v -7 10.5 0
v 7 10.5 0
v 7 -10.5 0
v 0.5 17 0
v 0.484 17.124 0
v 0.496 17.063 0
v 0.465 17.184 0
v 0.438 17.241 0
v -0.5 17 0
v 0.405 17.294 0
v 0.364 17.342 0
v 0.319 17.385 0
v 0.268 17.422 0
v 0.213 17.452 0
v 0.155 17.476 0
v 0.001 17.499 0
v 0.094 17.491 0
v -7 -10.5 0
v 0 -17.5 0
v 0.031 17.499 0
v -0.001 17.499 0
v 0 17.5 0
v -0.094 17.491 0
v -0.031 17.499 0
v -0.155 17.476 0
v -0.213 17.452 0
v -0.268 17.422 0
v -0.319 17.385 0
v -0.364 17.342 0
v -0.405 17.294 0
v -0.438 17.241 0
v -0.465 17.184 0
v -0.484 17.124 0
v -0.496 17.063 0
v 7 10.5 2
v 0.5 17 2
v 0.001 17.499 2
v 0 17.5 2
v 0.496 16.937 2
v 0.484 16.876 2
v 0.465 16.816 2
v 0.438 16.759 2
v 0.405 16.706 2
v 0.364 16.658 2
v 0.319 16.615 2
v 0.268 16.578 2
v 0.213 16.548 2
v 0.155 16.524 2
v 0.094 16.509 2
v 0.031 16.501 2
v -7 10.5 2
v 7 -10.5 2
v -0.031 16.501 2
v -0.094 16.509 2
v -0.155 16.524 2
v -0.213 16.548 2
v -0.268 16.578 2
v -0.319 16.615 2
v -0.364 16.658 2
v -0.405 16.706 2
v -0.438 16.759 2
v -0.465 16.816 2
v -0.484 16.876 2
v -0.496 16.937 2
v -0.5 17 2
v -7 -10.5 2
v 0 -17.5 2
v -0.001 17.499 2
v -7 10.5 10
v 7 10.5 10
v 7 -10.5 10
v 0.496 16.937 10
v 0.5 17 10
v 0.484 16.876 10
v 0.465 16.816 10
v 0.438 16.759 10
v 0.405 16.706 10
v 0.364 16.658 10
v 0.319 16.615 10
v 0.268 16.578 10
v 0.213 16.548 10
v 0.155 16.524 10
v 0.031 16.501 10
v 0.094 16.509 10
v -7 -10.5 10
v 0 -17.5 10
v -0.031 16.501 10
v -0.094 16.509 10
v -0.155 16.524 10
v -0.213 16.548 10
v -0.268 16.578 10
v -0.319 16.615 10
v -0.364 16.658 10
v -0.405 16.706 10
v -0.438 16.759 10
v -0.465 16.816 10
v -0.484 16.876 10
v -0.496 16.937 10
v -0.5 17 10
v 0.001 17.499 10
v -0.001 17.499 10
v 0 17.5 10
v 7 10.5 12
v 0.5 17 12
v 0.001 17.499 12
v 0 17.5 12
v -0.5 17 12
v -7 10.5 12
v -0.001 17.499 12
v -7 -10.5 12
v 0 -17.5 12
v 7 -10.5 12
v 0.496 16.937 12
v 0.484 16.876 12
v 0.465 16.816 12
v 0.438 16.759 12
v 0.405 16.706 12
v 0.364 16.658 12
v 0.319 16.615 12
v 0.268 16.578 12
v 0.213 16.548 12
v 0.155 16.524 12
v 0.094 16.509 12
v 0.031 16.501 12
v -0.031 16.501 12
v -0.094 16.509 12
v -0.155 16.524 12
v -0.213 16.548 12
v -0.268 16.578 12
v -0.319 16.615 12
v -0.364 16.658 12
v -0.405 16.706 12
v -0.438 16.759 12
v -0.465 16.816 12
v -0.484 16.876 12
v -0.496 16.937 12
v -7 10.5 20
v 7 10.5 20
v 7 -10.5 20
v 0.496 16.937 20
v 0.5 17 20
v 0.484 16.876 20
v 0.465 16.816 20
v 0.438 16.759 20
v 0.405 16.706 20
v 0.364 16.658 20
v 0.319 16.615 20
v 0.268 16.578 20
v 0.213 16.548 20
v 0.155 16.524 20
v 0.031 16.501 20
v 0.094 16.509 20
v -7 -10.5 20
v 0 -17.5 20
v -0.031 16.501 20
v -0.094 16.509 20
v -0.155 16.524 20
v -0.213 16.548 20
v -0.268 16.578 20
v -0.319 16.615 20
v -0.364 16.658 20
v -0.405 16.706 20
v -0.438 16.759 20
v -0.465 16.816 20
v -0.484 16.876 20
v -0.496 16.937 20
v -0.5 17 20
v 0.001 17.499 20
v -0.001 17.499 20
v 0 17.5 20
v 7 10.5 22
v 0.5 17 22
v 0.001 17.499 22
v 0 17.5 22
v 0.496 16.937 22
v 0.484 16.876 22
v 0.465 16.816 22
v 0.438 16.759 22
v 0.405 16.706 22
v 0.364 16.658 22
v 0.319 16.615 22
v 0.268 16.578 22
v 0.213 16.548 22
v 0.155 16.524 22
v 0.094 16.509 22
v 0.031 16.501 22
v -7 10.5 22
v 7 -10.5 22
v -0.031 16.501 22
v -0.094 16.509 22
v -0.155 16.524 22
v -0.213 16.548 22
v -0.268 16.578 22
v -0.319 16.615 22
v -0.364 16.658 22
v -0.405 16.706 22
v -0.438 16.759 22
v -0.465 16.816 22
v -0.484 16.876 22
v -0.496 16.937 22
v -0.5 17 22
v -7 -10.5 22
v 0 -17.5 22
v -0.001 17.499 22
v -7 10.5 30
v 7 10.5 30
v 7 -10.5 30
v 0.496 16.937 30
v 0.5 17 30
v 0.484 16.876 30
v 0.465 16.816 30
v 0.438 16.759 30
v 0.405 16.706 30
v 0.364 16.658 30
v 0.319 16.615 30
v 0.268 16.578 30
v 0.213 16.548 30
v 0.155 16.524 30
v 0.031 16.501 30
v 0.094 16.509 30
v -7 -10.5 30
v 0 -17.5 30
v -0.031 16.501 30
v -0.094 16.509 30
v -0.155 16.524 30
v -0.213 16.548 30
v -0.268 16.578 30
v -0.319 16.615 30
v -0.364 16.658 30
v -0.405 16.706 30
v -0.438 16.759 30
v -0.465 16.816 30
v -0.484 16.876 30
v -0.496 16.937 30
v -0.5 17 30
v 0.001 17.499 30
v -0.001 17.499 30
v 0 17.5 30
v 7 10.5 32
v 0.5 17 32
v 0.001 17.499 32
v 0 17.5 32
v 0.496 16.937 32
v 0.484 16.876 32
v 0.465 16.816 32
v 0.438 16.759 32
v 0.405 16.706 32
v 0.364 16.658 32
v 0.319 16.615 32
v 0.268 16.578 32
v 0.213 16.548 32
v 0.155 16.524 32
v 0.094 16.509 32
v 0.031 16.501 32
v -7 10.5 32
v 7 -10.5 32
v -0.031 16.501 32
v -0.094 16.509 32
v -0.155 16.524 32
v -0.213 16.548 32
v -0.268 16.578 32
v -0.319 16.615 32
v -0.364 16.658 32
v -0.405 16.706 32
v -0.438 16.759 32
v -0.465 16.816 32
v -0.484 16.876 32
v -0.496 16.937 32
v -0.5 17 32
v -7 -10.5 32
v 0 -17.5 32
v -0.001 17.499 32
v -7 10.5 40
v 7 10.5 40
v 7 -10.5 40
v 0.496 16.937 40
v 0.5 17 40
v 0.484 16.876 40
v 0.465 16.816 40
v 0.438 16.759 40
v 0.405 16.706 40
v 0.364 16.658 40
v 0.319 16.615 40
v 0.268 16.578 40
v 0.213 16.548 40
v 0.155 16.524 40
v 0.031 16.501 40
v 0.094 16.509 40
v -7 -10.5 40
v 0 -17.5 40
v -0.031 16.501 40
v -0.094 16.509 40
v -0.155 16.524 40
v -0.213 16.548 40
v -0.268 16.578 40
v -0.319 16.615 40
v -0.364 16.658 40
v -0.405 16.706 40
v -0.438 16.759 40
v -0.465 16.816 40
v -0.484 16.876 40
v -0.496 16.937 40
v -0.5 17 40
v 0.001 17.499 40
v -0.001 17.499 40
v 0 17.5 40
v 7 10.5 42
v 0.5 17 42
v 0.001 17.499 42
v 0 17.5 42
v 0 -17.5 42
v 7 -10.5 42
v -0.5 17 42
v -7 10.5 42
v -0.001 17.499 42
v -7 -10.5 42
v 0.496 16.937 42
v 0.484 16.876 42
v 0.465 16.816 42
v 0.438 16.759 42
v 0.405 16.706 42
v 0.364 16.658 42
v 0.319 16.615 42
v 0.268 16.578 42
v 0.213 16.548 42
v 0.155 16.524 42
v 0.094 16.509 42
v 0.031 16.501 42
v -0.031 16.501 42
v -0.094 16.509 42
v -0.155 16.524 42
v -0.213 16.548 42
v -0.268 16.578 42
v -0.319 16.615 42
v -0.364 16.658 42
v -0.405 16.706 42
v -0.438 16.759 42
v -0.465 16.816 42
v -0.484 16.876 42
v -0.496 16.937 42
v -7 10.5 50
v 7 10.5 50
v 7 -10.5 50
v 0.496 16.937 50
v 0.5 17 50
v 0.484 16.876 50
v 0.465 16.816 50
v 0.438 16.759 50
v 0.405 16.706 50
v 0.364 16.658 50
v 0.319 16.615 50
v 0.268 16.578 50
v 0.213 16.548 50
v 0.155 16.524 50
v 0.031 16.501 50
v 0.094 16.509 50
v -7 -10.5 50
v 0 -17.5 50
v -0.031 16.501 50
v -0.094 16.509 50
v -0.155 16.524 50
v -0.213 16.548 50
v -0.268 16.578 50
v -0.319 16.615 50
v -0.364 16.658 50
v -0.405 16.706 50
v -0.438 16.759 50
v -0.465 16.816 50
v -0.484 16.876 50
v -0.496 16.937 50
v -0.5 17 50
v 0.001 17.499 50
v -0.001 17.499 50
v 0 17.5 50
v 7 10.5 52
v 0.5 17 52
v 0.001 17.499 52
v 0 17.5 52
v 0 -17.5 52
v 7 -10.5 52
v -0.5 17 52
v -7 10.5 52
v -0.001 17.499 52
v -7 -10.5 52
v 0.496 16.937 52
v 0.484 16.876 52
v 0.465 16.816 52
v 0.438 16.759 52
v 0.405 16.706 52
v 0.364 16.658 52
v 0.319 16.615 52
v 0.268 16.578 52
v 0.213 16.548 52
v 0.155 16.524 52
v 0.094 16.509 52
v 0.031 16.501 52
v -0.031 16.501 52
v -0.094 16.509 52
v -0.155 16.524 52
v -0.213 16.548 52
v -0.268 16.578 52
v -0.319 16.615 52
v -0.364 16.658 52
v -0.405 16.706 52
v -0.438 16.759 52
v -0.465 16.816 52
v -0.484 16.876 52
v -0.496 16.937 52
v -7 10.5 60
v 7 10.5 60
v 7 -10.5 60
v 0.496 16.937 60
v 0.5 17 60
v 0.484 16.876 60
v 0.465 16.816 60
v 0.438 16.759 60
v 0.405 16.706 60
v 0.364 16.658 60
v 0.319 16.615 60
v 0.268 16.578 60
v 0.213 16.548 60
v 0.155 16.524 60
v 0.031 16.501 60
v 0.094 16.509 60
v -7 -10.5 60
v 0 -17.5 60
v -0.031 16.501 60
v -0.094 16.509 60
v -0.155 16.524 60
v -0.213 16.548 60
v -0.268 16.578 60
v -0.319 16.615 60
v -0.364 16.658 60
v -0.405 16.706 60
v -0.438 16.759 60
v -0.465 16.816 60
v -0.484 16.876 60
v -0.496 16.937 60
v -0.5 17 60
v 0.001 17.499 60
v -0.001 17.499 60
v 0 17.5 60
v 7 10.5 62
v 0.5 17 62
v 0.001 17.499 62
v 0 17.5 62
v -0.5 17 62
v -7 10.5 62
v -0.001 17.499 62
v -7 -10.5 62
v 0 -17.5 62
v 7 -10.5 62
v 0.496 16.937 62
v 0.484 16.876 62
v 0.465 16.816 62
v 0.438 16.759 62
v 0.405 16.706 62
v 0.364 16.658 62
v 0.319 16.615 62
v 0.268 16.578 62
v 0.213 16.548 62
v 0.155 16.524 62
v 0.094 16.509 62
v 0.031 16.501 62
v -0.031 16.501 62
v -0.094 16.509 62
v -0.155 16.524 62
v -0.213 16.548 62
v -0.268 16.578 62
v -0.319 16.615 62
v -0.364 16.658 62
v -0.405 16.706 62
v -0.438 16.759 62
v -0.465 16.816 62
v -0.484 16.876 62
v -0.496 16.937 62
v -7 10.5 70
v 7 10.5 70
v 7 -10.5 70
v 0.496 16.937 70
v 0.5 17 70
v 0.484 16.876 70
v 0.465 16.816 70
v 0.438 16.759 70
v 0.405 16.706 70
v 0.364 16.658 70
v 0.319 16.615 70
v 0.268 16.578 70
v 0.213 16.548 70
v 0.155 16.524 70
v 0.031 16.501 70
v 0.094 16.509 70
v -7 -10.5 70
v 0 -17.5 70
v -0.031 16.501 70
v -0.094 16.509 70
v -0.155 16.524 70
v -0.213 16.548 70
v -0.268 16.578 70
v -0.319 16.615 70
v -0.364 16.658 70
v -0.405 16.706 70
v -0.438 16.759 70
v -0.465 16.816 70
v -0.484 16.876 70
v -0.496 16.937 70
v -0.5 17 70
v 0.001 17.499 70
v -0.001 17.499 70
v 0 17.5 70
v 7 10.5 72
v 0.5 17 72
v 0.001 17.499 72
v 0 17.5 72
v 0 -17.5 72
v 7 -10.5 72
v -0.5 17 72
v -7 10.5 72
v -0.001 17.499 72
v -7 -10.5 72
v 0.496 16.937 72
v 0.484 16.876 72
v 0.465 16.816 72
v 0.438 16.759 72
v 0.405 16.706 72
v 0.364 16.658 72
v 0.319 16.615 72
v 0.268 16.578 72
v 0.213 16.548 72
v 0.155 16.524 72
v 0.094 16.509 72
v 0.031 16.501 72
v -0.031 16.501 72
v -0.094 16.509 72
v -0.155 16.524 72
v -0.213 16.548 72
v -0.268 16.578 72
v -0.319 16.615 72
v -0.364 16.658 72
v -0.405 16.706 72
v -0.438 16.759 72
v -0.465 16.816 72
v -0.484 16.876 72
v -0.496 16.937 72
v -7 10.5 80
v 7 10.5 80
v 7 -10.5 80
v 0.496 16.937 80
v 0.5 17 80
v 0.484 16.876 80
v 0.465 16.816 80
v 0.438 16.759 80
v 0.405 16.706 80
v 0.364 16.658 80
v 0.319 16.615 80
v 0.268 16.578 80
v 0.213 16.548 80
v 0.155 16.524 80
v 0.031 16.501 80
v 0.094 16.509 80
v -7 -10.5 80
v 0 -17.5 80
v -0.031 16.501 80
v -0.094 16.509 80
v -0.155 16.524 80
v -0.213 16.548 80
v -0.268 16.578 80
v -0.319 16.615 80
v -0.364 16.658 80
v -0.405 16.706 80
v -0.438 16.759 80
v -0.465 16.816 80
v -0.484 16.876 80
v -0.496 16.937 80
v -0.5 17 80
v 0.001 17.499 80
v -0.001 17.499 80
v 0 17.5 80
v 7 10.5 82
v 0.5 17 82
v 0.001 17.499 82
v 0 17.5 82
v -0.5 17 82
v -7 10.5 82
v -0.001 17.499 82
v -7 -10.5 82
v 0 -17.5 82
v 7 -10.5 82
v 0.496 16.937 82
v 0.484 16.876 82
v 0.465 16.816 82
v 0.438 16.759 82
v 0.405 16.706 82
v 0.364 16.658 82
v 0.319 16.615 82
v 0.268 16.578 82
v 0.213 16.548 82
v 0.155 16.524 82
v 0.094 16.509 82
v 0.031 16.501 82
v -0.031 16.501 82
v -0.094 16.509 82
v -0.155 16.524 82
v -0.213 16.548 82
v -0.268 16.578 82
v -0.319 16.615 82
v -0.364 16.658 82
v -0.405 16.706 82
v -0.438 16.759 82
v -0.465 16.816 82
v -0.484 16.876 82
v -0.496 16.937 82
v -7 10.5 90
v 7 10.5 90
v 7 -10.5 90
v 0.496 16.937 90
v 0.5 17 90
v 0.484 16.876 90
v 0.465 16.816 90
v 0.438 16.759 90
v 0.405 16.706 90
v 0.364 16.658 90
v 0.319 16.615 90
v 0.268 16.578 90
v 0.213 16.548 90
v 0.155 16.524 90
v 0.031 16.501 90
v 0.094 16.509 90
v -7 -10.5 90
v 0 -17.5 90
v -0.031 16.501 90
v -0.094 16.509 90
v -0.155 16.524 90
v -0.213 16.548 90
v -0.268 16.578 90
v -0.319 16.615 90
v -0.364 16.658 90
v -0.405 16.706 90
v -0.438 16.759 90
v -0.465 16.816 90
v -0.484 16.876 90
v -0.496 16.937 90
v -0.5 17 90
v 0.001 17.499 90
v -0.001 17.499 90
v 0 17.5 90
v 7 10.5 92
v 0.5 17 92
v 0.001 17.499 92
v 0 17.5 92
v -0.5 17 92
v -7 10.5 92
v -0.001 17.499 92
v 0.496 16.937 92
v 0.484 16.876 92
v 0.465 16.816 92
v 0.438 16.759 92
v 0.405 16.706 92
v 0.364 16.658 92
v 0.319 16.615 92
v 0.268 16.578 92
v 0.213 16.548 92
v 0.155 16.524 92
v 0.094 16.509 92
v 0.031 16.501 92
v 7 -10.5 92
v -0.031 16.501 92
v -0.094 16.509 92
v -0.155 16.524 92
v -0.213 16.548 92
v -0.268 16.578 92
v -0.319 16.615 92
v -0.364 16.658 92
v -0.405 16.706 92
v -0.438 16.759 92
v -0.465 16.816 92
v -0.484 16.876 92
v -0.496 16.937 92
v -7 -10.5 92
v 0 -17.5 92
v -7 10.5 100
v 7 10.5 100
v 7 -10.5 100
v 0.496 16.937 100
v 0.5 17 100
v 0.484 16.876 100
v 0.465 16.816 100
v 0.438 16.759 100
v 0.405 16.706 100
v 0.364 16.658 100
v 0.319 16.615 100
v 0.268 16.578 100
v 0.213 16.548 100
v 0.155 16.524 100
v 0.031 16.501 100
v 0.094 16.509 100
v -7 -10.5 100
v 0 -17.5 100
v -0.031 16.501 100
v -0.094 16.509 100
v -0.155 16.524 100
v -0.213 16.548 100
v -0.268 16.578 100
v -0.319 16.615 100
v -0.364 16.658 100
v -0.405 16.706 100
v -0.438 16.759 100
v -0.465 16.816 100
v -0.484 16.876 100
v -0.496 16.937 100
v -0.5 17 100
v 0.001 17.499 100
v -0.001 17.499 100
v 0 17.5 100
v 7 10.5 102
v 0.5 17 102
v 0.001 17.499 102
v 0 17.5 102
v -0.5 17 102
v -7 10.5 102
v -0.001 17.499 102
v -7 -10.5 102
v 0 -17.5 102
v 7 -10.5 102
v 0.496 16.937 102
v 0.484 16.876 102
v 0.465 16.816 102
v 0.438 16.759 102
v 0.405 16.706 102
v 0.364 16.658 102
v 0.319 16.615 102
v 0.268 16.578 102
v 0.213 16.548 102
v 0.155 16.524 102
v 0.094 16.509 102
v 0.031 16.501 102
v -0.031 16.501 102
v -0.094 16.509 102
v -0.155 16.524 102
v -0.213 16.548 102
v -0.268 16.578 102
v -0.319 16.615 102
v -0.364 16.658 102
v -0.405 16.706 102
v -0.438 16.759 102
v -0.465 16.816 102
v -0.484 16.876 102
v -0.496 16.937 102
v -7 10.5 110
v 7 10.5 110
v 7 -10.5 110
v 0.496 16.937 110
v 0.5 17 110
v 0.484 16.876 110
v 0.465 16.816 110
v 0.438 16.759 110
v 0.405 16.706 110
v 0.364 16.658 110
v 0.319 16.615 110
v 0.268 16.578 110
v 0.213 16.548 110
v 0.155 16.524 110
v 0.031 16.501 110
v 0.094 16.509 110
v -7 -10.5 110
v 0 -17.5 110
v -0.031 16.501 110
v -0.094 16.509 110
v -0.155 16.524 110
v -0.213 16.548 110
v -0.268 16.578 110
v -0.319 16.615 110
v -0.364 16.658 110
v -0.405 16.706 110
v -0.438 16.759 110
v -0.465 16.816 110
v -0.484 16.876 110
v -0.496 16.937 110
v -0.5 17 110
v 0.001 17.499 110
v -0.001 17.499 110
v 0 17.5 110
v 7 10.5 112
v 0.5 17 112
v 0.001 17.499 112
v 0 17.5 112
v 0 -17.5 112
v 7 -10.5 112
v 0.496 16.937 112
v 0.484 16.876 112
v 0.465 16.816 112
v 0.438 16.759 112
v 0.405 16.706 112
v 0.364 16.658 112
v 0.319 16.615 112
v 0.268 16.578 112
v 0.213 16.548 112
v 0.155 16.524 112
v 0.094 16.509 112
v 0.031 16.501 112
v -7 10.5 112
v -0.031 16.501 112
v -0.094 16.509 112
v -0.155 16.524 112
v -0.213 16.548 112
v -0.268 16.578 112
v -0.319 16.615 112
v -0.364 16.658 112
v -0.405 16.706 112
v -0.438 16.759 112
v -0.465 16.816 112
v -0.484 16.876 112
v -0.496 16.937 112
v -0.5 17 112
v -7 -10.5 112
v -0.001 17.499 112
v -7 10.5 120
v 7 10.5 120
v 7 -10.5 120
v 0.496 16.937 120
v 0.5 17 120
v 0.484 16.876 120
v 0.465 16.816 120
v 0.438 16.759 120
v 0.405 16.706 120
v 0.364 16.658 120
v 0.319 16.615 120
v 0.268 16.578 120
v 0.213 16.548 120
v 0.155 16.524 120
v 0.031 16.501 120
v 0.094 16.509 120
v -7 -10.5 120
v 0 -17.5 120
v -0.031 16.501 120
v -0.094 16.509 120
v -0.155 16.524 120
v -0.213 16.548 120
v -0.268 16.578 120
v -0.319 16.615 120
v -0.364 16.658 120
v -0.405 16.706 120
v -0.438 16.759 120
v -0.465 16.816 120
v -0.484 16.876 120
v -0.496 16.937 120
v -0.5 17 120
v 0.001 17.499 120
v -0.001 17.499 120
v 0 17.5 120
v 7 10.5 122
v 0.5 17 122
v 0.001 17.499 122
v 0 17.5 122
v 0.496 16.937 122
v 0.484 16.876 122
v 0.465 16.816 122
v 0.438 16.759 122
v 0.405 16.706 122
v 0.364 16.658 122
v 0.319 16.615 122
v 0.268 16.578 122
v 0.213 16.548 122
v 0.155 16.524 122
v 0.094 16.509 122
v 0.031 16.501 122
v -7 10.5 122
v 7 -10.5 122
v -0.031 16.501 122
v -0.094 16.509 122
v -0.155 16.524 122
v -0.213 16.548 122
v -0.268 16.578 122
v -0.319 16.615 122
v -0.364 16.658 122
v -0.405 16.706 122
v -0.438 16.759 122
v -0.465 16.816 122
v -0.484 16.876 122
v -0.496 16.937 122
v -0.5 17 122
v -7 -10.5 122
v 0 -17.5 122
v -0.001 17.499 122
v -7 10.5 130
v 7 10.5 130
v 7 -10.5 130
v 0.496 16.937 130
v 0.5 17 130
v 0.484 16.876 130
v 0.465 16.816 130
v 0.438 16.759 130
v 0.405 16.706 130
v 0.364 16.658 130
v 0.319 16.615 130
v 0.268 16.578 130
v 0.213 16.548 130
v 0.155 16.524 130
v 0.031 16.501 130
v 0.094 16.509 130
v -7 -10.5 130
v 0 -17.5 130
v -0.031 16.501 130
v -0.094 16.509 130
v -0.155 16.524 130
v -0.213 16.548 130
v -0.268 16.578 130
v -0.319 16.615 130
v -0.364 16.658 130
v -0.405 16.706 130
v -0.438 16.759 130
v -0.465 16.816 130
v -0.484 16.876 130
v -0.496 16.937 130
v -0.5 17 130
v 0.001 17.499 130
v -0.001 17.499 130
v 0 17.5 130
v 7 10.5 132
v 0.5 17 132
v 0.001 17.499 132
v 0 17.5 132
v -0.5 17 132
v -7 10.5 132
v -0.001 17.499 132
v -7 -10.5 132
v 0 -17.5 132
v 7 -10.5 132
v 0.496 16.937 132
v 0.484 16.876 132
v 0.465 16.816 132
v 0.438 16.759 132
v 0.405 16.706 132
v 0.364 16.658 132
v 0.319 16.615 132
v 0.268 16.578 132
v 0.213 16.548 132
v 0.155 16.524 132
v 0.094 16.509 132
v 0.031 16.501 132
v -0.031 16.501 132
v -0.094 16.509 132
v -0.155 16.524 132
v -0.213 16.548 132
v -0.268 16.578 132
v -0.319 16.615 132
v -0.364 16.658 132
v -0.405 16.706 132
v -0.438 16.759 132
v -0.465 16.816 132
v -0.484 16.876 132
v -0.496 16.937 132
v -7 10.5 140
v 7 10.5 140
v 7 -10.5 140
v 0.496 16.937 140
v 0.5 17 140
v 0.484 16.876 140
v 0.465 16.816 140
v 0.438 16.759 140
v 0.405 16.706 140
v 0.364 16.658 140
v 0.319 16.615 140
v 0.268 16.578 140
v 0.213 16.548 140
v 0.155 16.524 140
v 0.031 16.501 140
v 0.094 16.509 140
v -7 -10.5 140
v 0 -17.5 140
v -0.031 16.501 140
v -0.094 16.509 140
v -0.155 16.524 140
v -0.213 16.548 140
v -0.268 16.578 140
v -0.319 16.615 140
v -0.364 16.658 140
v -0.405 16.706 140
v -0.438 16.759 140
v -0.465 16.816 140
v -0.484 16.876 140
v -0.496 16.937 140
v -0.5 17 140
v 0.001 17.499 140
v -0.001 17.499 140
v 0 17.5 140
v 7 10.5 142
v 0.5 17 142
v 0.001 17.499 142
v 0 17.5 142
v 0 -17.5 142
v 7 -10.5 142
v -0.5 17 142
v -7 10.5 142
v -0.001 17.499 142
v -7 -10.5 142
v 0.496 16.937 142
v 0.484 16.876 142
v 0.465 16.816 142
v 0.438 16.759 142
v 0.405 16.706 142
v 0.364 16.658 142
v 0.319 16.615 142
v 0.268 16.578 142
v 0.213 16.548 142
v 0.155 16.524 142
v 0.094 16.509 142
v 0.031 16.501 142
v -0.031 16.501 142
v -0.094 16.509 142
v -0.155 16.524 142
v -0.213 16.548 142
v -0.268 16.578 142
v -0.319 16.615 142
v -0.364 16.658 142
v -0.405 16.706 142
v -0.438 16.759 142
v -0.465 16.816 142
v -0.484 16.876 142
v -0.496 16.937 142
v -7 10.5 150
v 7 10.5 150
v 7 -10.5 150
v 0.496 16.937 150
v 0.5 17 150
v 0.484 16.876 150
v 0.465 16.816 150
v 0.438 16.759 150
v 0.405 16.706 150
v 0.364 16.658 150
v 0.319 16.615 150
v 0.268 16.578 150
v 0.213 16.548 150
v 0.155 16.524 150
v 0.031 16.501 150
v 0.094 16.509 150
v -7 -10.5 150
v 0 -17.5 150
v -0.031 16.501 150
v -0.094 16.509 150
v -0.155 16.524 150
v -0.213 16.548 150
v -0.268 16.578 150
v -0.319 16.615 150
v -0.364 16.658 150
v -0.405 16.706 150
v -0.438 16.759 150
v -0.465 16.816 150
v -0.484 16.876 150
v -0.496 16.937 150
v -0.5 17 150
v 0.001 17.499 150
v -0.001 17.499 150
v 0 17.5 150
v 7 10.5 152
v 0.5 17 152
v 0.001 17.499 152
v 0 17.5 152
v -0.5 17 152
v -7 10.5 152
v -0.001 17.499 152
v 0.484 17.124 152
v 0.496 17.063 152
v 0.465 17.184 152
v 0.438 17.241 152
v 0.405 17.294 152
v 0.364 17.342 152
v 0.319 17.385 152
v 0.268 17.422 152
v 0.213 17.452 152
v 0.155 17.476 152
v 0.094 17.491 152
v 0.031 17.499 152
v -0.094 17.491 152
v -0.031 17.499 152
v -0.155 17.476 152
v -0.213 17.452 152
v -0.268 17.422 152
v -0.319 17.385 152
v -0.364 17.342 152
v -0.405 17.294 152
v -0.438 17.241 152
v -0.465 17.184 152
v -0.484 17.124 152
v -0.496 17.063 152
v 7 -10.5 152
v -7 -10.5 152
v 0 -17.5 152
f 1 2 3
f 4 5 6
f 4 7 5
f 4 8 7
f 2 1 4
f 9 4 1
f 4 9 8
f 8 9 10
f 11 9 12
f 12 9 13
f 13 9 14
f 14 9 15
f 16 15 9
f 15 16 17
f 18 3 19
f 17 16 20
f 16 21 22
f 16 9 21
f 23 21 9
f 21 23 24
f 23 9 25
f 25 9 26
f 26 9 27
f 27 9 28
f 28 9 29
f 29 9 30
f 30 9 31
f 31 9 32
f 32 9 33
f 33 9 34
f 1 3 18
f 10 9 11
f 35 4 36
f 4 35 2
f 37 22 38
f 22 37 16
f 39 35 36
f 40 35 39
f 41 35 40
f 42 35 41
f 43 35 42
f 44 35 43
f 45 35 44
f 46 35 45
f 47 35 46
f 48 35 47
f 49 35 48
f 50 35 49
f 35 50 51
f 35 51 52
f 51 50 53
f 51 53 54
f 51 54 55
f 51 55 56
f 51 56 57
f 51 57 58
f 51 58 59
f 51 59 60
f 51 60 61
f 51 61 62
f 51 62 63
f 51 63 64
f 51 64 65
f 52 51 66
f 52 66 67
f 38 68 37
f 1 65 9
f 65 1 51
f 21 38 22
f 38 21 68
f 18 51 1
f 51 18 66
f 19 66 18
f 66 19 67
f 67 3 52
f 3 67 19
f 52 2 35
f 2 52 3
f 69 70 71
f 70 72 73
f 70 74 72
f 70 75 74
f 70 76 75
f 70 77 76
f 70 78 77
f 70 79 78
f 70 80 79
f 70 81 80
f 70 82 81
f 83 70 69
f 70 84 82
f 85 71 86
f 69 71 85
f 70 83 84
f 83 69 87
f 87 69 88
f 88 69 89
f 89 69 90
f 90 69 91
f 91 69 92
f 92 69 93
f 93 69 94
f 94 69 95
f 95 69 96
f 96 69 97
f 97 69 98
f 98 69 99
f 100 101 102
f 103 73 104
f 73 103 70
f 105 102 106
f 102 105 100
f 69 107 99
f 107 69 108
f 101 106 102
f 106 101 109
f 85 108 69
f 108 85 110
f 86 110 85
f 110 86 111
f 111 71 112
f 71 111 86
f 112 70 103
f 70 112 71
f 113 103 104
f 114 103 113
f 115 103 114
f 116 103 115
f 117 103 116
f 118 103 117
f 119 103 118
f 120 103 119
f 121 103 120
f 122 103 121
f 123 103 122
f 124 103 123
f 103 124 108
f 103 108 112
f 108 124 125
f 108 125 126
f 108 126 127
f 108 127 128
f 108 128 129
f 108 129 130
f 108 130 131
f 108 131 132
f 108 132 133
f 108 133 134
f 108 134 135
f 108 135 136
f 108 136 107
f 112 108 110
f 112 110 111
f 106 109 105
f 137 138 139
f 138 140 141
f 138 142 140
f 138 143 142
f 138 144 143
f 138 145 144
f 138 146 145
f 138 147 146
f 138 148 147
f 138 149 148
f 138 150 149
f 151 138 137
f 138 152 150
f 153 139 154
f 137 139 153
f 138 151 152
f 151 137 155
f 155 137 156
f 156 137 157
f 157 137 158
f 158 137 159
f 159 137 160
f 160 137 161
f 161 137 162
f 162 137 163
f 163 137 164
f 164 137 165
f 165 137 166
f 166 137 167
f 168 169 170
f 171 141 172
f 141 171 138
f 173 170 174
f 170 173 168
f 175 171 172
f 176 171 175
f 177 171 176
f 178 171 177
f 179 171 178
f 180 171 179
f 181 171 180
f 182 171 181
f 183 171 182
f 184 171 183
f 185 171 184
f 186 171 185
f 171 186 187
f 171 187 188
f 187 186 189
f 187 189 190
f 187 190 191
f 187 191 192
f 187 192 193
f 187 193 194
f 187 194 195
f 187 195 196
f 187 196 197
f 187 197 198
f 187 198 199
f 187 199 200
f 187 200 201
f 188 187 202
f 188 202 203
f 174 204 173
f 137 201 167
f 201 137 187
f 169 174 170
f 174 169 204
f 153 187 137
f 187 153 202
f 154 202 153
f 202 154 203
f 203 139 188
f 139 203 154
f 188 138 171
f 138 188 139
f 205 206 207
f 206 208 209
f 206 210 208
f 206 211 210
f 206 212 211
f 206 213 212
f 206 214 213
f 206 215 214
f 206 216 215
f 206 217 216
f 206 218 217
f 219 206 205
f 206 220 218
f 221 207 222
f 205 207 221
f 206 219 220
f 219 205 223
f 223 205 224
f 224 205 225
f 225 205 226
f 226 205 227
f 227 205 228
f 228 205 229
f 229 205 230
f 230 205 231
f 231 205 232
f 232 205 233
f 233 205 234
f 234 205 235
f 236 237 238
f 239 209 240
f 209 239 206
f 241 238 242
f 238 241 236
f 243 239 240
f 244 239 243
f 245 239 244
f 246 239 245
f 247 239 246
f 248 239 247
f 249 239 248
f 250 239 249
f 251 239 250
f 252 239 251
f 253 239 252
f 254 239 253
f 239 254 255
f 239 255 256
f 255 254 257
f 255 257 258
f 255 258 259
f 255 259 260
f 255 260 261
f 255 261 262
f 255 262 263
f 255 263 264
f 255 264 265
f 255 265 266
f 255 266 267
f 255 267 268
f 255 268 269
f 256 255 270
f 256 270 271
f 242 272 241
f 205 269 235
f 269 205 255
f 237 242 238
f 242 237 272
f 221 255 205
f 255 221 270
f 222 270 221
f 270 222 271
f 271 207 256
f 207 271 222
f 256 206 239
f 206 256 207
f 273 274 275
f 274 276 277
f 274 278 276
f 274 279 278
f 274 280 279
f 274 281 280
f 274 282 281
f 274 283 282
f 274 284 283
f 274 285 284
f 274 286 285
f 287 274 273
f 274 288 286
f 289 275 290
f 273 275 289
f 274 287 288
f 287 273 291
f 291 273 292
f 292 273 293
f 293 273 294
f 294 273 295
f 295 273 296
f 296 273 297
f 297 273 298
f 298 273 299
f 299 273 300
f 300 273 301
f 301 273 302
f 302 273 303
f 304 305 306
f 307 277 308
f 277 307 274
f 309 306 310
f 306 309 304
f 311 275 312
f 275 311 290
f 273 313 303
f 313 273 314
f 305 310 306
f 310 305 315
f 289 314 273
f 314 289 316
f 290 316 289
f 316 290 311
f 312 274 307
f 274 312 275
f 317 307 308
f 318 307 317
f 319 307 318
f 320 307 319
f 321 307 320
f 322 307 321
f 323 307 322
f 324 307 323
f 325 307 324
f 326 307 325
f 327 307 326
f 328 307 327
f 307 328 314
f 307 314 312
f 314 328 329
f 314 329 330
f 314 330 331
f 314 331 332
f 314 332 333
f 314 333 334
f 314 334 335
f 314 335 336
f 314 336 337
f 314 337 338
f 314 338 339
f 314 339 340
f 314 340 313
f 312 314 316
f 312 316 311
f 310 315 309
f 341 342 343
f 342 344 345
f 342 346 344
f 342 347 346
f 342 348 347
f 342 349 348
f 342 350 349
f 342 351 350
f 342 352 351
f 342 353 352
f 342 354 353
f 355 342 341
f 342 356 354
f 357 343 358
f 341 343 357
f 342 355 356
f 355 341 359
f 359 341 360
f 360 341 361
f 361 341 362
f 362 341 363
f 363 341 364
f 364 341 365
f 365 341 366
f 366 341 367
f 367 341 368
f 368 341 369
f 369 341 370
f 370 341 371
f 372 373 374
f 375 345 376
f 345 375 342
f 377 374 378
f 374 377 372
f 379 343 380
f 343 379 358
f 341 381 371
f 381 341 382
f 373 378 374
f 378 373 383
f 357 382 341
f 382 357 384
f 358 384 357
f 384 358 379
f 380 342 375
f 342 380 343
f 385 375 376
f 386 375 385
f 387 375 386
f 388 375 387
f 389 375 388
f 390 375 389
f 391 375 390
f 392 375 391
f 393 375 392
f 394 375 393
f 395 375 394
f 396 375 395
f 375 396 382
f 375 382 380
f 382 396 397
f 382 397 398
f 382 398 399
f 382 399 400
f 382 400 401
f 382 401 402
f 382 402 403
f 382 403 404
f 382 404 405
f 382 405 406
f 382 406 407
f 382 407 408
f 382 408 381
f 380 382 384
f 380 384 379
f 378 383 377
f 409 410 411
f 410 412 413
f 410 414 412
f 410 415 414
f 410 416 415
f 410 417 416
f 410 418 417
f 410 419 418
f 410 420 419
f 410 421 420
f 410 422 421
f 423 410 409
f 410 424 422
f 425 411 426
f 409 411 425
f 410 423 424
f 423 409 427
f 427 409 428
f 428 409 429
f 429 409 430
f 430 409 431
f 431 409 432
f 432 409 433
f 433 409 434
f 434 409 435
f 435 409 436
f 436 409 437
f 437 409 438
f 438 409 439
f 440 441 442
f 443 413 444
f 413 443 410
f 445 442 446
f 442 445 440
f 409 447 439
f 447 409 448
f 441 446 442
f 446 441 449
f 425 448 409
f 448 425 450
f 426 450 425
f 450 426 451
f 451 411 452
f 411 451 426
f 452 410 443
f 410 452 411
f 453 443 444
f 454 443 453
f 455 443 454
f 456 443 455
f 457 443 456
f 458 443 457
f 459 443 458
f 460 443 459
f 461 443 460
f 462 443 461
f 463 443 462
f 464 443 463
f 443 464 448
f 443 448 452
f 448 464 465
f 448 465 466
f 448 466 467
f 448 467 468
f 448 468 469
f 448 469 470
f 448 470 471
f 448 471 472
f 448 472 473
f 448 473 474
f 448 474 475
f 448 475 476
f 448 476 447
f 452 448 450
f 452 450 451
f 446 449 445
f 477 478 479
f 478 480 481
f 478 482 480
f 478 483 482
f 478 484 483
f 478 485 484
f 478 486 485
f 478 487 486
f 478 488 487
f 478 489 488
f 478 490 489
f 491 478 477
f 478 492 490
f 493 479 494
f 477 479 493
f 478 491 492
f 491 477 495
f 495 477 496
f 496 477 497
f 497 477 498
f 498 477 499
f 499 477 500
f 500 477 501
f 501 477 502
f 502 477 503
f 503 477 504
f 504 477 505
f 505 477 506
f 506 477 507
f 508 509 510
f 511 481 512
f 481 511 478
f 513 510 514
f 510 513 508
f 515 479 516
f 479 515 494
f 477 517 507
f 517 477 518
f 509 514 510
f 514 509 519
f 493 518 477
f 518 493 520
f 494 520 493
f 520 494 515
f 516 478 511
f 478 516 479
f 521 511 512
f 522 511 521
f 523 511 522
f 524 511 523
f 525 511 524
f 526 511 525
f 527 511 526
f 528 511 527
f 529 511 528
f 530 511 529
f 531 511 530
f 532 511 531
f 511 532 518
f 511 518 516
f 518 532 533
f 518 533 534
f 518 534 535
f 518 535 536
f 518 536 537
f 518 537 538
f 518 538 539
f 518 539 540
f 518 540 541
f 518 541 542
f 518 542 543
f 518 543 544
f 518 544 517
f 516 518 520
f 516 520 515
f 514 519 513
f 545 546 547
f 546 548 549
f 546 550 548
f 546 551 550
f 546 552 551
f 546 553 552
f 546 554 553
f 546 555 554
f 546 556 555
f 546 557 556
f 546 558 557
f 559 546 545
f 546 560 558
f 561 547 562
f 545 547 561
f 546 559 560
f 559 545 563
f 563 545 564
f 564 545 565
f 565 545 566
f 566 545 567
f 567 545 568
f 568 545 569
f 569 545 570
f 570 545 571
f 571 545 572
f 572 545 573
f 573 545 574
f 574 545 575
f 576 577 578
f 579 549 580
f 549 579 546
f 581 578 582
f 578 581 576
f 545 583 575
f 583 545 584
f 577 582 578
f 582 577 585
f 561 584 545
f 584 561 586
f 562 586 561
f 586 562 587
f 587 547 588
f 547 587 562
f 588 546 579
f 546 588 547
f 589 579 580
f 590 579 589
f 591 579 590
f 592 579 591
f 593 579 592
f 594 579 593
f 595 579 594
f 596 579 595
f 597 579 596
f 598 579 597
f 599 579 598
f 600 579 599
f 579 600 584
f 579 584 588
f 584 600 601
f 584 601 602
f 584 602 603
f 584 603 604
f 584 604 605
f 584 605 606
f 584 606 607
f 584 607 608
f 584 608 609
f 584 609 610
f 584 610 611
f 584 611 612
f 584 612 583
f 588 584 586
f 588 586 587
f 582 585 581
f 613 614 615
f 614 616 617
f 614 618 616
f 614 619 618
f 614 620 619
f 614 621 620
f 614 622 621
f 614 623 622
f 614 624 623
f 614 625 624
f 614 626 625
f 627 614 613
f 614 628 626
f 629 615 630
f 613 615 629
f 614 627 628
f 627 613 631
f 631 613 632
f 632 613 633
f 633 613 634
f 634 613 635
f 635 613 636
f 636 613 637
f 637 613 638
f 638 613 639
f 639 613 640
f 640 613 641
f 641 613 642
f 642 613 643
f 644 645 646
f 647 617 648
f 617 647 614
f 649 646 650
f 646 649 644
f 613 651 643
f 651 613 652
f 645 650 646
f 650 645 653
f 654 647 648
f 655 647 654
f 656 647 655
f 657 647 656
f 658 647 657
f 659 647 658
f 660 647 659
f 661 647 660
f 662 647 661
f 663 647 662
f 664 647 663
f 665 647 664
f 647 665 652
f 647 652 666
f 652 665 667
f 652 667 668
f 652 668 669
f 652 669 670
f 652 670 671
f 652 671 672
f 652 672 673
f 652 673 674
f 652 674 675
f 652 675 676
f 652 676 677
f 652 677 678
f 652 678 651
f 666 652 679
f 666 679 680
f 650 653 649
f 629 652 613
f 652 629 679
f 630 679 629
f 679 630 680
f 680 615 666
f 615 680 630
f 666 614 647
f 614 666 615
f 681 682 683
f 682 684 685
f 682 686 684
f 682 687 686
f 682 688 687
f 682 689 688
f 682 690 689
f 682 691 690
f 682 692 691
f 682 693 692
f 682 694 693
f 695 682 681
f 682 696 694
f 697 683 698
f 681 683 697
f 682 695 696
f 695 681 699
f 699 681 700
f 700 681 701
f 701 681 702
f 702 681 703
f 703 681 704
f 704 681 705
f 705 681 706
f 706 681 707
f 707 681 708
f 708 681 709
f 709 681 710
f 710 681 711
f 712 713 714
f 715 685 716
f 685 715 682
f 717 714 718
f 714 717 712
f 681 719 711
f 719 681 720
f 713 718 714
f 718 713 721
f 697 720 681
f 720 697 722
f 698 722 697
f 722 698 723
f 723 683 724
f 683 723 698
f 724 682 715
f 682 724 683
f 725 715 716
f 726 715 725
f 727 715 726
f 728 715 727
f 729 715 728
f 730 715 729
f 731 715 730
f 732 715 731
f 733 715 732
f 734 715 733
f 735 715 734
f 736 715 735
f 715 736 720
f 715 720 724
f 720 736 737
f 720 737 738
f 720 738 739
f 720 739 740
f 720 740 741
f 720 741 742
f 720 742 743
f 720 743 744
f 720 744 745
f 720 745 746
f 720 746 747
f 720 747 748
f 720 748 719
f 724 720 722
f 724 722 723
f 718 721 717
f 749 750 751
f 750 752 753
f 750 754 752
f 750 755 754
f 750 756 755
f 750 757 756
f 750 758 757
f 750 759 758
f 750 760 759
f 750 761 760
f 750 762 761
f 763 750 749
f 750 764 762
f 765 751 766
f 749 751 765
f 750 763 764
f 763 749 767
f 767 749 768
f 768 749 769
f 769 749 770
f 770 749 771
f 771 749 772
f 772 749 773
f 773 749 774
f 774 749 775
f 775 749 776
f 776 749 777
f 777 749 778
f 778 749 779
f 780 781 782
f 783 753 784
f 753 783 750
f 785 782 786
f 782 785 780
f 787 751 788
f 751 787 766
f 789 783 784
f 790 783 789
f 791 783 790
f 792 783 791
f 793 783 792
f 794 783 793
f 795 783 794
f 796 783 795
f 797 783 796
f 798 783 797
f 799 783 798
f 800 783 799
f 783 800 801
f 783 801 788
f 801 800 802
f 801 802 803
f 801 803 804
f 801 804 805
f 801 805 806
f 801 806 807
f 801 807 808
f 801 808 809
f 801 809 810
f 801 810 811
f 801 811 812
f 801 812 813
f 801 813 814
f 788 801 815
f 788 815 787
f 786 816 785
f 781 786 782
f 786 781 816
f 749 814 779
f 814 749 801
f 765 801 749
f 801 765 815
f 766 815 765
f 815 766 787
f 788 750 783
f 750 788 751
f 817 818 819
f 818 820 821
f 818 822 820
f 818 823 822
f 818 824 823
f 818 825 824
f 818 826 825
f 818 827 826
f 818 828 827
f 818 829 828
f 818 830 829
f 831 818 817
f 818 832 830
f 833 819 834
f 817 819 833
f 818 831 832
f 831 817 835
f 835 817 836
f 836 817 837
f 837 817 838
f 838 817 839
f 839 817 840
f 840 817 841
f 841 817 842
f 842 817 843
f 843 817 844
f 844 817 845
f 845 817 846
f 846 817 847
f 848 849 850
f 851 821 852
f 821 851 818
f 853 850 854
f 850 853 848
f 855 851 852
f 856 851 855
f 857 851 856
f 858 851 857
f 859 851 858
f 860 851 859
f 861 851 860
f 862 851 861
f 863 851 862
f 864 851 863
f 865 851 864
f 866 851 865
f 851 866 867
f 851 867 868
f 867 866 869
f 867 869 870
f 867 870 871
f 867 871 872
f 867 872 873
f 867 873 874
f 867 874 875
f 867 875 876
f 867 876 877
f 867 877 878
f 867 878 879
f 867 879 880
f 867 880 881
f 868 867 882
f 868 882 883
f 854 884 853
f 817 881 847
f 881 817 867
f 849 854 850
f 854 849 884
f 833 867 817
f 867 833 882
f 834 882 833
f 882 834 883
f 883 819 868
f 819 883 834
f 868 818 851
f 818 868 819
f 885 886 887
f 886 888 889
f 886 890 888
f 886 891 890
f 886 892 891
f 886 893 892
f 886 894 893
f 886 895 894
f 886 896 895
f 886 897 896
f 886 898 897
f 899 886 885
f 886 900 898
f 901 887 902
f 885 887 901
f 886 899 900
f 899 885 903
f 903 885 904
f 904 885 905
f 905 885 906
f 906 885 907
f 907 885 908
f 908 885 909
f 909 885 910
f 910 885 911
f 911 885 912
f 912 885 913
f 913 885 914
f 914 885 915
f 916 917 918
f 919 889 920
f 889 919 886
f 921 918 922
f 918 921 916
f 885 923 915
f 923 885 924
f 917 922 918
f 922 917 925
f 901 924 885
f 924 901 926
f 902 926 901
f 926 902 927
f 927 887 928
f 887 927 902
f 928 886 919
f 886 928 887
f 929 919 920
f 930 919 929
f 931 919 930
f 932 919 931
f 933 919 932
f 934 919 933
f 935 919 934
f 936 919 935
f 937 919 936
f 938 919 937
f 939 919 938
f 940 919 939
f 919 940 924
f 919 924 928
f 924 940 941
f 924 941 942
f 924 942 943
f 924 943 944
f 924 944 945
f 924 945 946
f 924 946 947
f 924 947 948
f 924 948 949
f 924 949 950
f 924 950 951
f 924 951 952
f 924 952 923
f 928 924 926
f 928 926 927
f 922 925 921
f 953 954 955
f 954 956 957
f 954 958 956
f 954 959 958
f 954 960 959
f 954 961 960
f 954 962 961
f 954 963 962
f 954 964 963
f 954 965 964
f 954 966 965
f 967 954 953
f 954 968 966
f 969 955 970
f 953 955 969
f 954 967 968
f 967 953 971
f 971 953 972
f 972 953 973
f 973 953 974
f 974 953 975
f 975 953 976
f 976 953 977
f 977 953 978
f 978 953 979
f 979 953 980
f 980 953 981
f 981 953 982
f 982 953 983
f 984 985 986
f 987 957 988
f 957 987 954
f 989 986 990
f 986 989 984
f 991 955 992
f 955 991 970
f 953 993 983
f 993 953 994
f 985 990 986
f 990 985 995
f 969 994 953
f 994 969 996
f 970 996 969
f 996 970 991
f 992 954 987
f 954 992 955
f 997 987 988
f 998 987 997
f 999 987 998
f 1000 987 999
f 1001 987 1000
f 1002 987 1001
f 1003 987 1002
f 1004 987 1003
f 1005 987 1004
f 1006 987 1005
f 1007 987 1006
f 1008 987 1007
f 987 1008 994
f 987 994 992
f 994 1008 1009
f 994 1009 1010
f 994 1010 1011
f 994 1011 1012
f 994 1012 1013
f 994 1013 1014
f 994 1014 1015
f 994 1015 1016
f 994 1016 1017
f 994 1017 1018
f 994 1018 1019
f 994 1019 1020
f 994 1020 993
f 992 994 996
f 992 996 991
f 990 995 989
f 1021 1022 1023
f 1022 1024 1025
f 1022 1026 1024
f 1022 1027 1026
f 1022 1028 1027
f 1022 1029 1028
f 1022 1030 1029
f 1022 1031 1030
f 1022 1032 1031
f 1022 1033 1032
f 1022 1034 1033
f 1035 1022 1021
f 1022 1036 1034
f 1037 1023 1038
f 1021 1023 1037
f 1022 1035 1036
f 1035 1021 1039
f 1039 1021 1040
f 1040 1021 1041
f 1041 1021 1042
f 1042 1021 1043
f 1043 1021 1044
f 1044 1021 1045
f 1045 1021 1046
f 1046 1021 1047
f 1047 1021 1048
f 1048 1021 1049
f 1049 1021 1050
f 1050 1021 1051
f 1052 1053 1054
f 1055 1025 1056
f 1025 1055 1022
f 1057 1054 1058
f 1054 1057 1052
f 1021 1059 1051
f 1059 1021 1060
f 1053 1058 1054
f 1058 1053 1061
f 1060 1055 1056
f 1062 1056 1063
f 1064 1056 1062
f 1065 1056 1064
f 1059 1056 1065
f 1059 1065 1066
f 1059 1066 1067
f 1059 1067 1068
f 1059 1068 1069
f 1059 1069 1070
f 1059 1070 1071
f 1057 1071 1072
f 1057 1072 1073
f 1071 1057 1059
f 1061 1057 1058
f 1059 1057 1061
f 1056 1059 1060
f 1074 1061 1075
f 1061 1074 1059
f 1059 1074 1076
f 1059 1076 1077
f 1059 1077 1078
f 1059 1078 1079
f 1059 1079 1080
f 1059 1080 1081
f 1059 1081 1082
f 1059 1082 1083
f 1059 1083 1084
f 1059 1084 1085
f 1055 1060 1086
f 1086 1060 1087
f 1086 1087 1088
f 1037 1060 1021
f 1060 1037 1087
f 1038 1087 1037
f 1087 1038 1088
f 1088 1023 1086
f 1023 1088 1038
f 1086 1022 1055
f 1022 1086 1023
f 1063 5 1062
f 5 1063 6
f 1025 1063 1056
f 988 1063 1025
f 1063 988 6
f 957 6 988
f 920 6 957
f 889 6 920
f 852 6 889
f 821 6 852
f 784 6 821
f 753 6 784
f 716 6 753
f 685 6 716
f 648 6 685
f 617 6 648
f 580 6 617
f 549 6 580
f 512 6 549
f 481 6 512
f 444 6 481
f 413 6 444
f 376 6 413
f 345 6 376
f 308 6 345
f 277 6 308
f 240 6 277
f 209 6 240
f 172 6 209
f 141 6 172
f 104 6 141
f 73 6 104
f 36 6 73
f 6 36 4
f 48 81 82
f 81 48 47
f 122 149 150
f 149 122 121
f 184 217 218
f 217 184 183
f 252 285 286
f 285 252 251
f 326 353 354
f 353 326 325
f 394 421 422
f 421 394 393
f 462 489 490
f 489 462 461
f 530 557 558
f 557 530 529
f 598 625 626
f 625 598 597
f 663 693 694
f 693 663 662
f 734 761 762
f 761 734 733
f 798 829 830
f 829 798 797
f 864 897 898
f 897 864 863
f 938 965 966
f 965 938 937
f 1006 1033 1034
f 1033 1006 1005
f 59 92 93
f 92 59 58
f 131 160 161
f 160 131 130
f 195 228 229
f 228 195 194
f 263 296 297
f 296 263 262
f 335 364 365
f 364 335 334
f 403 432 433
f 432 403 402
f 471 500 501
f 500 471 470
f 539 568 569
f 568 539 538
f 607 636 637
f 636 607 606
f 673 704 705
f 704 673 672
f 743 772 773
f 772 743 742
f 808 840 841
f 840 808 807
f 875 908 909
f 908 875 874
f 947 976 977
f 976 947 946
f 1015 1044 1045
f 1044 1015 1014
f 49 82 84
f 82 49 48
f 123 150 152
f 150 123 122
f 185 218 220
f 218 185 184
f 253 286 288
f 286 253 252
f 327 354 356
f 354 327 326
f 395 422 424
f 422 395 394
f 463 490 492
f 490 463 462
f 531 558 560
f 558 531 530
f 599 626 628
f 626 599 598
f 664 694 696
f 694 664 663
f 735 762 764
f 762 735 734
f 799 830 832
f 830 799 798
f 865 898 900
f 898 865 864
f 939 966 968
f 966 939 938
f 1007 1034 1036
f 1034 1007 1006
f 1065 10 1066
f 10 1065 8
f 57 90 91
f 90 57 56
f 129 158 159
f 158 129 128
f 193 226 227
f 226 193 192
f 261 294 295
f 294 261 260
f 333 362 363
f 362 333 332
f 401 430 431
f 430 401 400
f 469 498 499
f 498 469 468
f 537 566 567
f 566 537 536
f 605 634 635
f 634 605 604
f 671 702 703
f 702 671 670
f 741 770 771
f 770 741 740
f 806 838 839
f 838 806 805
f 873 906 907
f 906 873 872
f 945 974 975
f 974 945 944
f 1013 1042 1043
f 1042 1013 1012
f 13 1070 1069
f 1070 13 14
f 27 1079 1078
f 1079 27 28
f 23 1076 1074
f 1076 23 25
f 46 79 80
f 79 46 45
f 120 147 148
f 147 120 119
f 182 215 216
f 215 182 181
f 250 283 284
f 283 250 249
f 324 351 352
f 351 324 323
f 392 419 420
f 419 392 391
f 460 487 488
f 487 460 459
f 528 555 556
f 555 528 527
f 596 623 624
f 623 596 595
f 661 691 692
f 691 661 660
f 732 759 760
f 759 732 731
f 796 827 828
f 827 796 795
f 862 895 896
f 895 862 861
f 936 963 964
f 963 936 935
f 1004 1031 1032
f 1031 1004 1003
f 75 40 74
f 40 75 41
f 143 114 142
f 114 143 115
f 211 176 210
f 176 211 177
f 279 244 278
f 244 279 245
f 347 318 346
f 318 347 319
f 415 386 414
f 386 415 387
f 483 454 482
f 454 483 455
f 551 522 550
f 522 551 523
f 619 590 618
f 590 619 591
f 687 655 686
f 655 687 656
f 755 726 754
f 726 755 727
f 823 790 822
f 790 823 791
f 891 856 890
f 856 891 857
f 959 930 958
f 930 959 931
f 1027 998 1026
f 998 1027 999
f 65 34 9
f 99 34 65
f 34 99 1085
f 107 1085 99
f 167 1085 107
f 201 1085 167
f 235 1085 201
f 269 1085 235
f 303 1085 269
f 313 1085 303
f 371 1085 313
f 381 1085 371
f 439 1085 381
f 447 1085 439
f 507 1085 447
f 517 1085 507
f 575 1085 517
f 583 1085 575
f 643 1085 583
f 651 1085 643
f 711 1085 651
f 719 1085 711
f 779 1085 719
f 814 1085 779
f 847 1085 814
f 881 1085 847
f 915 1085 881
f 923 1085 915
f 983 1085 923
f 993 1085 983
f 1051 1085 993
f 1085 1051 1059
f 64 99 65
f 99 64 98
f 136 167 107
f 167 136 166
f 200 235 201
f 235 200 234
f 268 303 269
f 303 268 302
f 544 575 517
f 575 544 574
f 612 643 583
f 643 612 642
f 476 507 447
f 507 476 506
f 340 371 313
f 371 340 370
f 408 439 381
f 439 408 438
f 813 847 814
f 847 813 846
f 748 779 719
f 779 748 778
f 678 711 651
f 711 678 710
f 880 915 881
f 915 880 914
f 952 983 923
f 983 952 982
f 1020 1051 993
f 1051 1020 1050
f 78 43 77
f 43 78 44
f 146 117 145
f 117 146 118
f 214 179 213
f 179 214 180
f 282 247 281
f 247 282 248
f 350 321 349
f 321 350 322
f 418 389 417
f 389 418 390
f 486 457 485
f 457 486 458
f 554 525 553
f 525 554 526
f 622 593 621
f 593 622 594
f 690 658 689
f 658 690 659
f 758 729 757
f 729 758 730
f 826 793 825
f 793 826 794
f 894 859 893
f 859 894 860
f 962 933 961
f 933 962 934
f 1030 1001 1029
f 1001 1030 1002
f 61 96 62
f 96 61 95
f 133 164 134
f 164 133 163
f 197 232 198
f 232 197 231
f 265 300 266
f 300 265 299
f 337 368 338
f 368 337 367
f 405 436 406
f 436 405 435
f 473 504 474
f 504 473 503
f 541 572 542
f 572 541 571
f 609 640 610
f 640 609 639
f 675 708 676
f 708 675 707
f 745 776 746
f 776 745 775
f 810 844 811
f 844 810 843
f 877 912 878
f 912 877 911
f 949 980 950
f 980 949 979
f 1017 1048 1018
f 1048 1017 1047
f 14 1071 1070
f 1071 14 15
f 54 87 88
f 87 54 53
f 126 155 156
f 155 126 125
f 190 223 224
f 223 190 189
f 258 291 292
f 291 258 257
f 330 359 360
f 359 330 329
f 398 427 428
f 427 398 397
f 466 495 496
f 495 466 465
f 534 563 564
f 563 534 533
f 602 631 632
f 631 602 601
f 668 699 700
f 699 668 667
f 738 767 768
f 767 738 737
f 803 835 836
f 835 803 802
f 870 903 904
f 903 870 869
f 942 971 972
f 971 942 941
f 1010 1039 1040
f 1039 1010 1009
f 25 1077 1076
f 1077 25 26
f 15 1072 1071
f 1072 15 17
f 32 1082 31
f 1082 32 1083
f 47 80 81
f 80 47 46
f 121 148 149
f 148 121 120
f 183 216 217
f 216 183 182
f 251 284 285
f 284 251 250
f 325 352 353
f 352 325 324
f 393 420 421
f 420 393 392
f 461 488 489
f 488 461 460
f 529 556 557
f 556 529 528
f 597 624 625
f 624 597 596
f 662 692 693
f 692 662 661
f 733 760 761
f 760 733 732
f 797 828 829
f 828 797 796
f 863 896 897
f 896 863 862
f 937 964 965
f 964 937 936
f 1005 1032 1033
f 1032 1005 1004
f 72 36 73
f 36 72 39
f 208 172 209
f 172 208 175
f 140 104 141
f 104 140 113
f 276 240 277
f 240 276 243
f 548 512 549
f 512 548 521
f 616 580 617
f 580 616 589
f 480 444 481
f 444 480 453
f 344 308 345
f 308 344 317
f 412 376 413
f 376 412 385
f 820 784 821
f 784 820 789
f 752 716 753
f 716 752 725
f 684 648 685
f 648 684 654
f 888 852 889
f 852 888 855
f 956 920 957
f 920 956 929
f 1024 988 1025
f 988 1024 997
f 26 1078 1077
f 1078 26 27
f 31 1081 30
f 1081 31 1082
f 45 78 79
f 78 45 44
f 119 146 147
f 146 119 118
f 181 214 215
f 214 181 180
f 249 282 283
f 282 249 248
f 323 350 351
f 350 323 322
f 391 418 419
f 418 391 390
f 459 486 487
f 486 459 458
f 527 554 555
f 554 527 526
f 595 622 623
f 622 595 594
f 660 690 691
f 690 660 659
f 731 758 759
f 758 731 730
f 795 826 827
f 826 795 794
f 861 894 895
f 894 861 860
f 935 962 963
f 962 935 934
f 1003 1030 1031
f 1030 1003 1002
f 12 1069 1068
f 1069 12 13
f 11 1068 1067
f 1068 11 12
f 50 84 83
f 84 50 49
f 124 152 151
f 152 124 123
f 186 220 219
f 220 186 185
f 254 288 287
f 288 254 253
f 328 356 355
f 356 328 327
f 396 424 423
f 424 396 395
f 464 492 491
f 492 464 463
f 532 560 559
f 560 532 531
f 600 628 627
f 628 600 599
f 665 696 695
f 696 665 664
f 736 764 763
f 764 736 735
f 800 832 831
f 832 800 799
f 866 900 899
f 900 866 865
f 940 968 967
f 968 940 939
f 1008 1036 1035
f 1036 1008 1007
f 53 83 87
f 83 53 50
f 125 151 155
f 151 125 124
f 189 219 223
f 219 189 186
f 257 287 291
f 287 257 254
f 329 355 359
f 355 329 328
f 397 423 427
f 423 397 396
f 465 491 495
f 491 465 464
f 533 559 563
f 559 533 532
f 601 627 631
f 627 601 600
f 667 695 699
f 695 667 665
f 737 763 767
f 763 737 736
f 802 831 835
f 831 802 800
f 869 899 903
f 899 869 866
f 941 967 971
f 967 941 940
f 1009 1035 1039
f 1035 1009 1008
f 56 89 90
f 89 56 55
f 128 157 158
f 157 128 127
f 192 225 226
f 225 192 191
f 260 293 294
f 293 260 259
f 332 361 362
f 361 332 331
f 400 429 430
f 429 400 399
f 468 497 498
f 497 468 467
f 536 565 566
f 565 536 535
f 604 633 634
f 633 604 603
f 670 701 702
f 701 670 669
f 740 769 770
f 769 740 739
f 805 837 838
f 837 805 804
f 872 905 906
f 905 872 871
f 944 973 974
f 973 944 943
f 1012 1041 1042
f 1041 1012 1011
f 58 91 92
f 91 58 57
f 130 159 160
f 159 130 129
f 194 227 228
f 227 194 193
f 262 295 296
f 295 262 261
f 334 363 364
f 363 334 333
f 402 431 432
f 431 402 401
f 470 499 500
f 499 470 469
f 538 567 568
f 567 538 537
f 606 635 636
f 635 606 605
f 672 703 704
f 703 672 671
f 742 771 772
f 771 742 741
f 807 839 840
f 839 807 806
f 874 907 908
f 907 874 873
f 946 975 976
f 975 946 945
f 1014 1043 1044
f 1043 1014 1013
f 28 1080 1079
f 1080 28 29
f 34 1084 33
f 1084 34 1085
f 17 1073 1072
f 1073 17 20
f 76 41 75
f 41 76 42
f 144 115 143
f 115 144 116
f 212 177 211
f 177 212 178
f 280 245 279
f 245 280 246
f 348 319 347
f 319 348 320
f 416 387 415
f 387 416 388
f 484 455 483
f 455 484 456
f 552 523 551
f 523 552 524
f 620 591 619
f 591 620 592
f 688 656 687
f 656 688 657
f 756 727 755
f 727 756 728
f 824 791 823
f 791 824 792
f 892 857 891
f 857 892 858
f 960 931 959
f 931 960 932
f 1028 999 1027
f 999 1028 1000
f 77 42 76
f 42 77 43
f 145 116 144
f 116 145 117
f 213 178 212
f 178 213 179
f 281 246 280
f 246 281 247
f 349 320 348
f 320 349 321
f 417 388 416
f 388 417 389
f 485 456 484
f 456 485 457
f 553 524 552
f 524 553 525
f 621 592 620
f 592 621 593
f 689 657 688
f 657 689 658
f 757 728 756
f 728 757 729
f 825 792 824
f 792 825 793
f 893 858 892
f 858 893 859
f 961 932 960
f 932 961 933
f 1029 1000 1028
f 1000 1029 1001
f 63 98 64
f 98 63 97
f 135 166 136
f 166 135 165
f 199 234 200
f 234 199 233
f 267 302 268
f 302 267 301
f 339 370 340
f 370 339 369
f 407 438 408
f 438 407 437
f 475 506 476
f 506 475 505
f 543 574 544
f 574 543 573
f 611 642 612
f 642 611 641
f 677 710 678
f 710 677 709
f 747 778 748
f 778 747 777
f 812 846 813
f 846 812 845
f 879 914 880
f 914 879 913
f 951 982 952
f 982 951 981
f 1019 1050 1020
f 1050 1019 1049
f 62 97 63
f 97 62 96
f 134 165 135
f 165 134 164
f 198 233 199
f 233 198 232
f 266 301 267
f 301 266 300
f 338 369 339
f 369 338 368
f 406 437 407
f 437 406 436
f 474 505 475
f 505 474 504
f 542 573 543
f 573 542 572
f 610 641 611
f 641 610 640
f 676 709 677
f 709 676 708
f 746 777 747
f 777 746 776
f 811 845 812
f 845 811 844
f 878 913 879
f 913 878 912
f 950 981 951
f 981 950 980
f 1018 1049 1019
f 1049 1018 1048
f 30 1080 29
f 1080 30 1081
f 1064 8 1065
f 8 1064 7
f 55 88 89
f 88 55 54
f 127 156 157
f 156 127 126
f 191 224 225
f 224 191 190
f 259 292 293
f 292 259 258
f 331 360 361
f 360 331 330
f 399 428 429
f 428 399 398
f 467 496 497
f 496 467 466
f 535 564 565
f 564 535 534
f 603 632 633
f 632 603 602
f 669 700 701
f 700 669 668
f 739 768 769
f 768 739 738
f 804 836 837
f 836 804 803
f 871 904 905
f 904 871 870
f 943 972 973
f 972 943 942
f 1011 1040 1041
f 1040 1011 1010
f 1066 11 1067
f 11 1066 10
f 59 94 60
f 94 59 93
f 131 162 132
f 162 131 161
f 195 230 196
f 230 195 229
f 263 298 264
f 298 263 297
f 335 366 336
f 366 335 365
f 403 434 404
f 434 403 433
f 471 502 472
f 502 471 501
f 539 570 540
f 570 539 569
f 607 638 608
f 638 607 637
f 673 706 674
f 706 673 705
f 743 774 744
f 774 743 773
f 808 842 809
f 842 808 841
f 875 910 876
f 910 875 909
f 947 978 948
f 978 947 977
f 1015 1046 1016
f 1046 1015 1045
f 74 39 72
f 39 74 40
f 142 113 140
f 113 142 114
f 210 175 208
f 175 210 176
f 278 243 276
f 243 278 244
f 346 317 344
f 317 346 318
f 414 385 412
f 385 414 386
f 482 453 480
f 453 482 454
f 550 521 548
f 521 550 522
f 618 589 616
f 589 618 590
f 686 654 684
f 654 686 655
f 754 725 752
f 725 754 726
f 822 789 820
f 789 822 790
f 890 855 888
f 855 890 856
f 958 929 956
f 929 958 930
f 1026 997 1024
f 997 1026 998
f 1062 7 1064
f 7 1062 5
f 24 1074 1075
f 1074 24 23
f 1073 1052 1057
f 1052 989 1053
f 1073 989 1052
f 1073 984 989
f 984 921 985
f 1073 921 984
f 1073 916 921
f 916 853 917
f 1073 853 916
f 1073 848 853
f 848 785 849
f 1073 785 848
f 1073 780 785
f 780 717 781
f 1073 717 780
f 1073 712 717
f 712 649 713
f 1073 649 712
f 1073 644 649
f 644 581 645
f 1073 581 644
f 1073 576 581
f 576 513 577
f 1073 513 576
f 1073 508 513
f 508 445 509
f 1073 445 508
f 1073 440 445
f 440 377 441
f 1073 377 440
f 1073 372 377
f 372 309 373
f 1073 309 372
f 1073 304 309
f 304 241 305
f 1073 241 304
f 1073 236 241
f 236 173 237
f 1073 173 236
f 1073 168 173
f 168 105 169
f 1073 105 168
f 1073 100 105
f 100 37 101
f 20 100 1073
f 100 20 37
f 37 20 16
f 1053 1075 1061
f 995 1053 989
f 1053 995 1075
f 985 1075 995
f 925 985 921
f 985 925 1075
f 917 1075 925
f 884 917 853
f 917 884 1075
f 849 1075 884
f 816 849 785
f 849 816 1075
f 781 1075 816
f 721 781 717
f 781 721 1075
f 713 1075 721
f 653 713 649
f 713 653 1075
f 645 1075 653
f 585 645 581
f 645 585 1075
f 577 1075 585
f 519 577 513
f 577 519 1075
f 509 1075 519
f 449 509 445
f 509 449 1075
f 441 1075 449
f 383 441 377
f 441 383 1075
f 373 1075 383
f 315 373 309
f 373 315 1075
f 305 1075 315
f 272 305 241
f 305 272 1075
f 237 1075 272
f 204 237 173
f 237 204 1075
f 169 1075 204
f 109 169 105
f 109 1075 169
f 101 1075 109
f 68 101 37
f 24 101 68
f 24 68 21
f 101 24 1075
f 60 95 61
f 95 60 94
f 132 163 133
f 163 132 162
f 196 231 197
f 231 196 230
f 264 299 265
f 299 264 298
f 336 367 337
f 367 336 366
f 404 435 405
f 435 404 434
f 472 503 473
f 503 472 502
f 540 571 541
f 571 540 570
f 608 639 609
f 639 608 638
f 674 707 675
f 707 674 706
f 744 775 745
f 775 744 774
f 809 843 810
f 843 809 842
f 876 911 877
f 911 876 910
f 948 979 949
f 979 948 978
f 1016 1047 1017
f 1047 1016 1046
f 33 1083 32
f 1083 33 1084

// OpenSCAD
module hexagon (
    length = 35,
    width = 14,
    height = 2,
    ) {
    x_0 = 0;
    y_0 = length / 2;
    x_1 = width / 2;
    y_1 = (length / 2) - (width / 2);
    x_2 = width / 2;
    y_2 = (-length / 2) + (width / 2);
    x_3 = 0;
    y_3 = -length / 2;
    x_4 = -width / 2;
    y_4 = (-length / 2) + (width / 2);
    x_5 = -width / 2;
    y_5 = (length / 2) - (width / 2);
    points = [
        [x_0,y_0],
        [x_1,y_1],
        [x_2,y_2],
        [x_3,y_3],
        [x_4,y_4],
        [x_5,y_5]];
    paths = [[0,1,2,3,4,5]];
    linear_extrude(height) { 
    polygon(points, paths);
    }
}
for (i = [0:15]) {
translate([0,0,i*10]) 
hexagon();
}
$fn = 50;
translate([0,17,0])
cylinder(r=.5,h=152); 
